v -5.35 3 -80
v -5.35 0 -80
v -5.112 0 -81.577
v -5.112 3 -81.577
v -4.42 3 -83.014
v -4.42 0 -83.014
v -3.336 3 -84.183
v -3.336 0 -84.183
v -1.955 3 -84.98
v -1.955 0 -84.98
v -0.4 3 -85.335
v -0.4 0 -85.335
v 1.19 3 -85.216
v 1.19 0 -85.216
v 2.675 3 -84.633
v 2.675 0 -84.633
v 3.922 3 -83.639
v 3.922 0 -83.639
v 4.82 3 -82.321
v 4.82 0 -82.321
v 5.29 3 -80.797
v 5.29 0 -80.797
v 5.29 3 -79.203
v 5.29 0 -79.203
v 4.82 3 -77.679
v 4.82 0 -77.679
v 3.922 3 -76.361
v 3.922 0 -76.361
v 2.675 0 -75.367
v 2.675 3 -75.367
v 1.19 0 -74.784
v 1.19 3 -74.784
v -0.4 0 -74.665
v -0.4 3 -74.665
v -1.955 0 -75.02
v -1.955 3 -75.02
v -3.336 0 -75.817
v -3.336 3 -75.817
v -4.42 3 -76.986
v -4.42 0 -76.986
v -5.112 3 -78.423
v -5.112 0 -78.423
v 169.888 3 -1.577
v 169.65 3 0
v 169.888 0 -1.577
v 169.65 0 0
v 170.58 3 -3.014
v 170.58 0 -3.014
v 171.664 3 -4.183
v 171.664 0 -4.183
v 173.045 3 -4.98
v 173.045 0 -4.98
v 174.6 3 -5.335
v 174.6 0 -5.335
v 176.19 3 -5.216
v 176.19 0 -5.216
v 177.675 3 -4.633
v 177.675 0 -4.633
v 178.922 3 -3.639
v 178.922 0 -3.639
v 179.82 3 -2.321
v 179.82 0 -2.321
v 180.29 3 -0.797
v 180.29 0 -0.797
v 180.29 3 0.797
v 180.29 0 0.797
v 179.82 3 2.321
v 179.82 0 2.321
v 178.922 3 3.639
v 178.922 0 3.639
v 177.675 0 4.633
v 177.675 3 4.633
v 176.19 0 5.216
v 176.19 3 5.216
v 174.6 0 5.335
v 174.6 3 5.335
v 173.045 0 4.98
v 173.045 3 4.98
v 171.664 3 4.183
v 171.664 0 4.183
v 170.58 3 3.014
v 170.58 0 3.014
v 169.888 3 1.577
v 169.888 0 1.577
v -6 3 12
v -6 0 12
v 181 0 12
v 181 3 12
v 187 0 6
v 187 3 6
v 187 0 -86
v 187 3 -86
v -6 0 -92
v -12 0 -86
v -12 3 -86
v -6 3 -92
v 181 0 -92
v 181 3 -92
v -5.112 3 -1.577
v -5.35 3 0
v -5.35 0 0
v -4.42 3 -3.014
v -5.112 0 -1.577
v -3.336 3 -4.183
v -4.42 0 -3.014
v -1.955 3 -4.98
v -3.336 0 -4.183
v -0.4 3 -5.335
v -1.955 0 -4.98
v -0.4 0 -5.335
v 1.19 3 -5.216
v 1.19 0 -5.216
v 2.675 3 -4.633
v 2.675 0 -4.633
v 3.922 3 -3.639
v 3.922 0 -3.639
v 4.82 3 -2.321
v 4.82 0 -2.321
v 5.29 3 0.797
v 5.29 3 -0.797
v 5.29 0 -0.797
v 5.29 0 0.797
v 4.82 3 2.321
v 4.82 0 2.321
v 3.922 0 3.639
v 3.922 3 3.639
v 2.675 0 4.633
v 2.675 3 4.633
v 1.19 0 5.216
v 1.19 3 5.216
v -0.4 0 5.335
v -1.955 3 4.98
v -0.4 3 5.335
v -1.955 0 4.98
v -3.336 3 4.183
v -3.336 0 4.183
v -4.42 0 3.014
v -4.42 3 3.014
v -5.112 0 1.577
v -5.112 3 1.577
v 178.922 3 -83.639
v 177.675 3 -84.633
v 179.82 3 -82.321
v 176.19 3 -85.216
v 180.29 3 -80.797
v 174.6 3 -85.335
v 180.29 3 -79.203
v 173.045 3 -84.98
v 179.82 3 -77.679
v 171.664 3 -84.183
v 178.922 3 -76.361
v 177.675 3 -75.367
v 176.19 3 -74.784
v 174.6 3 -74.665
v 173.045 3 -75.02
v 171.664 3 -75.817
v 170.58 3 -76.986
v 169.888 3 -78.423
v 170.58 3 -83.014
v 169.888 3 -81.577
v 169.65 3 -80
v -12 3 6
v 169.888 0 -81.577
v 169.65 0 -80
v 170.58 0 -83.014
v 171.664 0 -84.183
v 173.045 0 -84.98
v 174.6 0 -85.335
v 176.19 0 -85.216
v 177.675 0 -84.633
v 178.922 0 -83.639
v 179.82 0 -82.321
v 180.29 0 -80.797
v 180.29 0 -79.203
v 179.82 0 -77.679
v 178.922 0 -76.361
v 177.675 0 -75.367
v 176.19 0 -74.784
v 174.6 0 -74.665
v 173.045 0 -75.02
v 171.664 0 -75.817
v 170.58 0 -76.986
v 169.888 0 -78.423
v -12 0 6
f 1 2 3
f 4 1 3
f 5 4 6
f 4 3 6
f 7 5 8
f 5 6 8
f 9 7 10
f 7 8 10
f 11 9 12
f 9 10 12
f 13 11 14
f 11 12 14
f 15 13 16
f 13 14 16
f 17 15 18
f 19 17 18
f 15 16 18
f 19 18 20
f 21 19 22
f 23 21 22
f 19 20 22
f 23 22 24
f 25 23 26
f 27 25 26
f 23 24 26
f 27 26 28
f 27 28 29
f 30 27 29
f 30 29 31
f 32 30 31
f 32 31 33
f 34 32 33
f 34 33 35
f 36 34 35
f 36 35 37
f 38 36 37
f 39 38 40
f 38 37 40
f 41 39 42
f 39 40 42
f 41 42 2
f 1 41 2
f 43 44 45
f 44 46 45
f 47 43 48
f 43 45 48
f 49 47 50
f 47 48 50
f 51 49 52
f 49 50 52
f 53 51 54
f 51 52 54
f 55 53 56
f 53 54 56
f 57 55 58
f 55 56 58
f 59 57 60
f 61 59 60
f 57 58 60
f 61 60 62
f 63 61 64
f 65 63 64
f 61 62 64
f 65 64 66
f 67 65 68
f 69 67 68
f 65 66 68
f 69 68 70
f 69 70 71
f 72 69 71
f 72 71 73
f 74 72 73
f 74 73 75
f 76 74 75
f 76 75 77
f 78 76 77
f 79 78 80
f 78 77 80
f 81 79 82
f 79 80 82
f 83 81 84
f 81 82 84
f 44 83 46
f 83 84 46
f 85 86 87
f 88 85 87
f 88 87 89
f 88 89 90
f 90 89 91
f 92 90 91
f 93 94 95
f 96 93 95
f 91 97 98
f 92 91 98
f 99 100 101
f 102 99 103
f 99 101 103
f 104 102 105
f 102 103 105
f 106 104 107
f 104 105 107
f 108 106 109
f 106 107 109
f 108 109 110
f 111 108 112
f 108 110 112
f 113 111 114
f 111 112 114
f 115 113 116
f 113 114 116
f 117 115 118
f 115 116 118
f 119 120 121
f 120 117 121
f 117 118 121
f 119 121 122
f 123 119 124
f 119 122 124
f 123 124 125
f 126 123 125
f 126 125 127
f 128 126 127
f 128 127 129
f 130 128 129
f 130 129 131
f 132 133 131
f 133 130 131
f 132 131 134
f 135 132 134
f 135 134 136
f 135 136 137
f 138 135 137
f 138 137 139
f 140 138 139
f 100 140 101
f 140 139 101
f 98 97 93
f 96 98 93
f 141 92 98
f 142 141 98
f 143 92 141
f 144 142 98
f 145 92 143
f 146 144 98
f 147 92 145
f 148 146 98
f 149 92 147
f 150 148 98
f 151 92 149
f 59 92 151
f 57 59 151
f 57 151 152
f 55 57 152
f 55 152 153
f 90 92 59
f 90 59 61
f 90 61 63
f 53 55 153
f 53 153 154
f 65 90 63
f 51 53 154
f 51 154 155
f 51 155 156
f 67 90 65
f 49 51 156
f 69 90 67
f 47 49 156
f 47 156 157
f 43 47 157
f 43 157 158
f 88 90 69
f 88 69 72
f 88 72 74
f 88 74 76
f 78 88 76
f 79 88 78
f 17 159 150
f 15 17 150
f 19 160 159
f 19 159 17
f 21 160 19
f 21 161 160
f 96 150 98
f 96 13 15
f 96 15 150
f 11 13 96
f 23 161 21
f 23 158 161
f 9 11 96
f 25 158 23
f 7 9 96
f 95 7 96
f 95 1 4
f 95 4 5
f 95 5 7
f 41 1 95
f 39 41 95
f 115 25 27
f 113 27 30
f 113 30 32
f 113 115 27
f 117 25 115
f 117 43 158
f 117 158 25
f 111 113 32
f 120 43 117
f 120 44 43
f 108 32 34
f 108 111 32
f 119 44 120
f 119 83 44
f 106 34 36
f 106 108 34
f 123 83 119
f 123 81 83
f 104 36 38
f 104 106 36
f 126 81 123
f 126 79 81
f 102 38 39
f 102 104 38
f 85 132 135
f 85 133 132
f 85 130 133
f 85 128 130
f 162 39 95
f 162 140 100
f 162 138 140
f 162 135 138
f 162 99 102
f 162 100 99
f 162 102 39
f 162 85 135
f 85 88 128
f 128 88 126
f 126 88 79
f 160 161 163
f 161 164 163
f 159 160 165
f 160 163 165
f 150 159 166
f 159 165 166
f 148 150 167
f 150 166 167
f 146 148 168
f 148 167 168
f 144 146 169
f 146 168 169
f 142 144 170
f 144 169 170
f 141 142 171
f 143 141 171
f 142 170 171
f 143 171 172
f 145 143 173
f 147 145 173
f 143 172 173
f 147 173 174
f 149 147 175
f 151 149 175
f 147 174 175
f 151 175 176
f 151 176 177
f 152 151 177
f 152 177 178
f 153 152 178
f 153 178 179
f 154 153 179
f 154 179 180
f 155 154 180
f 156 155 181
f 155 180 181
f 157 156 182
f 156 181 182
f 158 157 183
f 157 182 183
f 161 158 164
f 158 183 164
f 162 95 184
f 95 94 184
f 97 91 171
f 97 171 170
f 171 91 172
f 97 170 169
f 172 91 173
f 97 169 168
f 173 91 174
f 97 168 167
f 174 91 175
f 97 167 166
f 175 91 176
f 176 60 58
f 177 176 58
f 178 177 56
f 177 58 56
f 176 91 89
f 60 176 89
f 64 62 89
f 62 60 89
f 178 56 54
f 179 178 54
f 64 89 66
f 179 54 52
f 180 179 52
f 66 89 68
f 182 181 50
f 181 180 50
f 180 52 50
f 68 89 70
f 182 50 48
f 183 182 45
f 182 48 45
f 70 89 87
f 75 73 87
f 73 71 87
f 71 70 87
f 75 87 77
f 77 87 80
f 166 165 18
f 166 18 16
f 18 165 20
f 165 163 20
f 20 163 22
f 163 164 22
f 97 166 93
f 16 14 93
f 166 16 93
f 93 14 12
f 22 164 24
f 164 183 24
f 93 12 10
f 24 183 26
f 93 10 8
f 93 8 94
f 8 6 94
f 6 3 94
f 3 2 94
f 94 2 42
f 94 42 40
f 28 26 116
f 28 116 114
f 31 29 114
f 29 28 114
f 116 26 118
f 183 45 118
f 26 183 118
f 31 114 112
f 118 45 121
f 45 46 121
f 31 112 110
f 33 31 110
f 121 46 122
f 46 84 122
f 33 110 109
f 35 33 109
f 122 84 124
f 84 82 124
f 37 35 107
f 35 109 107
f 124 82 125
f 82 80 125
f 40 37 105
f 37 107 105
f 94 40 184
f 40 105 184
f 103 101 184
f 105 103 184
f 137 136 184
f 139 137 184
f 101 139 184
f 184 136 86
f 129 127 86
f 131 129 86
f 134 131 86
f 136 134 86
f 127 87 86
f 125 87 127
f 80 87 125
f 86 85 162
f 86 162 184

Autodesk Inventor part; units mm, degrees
ref_plane "YZ Plane" through (0, 0, 0) normal (1, 0, 0) x (0, 1, 0)
ref_plane "XZ Plane" through (0, 0, 0) normal (0, 1, 0) x (-1, 0, 0)
ref_plane "XY Plane" through (0, 0, 0) normal (0, 0, 1) x (1, 0, 0)
sketch "Sketch1" plane through (0, 0, 0) normal (0, 1, 0) x (-1, 0, 0)
  line L0 (0, 0) -> (-175, 0)
  line L1 (-175, 0) -> (-175, -80)
  line L2 (-175, -80) -> (0, -80)
  line L3 (0, -80) -> (0, 0)
  circle A0 centre (0, 0) radius 5.35
  circle A1 centre (0, -80) radius 5.35
  circle A2 centre (-175, -80) radius 5.35
  circle A3 centre (-175, 0) radius 5.35
  line L4 (12, 12) -> (-187, 12)
  line L5 (-187, 12) -> (-187, -92)
  line L6 (-187, -92) -> (12, -92)
  line L7 (12, -92) -> (12, 12)
  dimension "d0" = 175
  dimension "d1" = 80
  dimension "d2" = 10.7
  dimension "d3" = 10.7
  dimension "d4" = 10.7
  dimension "d5" = 10.7
  dimension "d6" = 12
  dimension "d7" = 12
  dimension "d8" = 12
  dimension "d9" = 12
extrude "Plate1" add sketch "Sketch1" along normal blind 3 contours L0 A0 L3 A1 L2 A2 L1 A3 | L7 L6 L5 L4
chamfer "Corner Chamfer1" distance 6 angle 45 4 edges at (-12, 1.5, 12) (187, 1.5, 12) (187, 1.5, -92) (-12, 1.5, -92)
equation "\"d3\" = d2"
equation "\"d4\" = d2"
equation "\"d5\" = d2"
equation "\"d7\" = d6"
equation "\"d8\" = d6"
equation "\"d9\" = d8"
equation "\"d10\" = Thickness"
equation "\"BendRadius\" = Thickness"
equation "\"BendReliefWidth\" = Thickness"
equation "\"BendReliefDepth\" = 0.5 * Thickness"
equation "\"CornerReliefSize\" = 4 * Thickness"
equation "\"MinimumRemnant\" = 2 * Thickness"
equation "\"TransitionRadius\" = BendRadius"
equation "\"JacobiRadiusSize\" = BendRadius"
equation "\"GapSize\" = Thickness"
equation "\"Thickness\" = 3"
properties part number "Extender" material "Stainless Steel"
